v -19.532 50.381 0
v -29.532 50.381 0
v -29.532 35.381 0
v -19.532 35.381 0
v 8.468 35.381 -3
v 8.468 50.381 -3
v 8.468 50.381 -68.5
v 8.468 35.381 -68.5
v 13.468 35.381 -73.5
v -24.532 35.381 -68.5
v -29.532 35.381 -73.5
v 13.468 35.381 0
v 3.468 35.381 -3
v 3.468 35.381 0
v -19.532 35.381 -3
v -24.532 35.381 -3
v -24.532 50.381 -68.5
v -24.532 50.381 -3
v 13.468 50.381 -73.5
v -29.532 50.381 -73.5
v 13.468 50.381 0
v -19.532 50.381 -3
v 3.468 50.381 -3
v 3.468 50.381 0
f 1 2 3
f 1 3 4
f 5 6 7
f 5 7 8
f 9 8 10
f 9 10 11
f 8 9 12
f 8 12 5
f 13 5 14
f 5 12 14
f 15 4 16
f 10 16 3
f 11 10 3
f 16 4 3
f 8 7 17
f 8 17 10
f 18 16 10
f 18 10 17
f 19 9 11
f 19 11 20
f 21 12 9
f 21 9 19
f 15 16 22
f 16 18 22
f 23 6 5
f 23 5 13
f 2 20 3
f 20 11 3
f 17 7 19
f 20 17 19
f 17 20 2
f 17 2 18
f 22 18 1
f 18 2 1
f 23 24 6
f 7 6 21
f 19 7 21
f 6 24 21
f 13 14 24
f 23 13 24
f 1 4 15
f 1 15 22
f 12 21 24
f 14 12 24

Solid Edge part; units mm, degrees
sketch "Sketch1" plane through (0, 0, 0) normal (0, 0, 1) x (1, 0, 0)
  line L0 (-19.5323, 35.3812) -> (-19.5323, 50.3812)
  line L1 (-19.5323, 50.3812) -> (-24.5323, 50.3812)
  line L2 (-24.5323, 50.3812) -> (-24.5323, 35.3812)
  line L3 (-24.5323, 35.3812) -> (-19.5323, 35.3812)
  line L4 (8.4677, 50.3812) -> (8.4677, 35.3812)
  line L5 (8.4677, 35.3812) -> (3.4677, 35.3812)
  line L6 (3.4677, 35.3812) -> (3.4677, 50.3812)
  line L7 (3.4677, 50.3812) -> (8.4677, 50.3812)
  dimension "D1" = 33
  dimension "D2" = 15
extrude "Protrusion1" add sketch "Sketch1" against normal blind 3
sketch "Sketch2" plane through (0, 0, 0) normal (0, 0, 1) x (1, 0, 0)
  line L0 (13.4677, 35.3812) -> (13.4677, 50.3812)
  line L1 (13.4677, 50.3812) -> (8.4677, 50.3812)
  line L2 (8.4677, 50.3812) -> (8.4677, 35.3812)
  line L3 (8.4677, 35.3812) -> (13.4677, 35.3812)
  line L4 (-29.5323, 35.3812) -> (-24.5323, 35.3812)
  line L5 (-24.5323, 35.3812) -> (-24.5323, 50.3812)
  line L6 (-24.5323, 50.3812) -> (-29.5323, 50.3812)
  line L7 (-29.5323, 50.3812) -> (-29.5323, 35.3812)
extrude "Protrusion2" add sketch "Sketch2" against normal blind 68.5
sketch "Sketch3" plane through (13.4677, 42.8812, -34.25) normal (1, 0, 0) x (0, -1, 0)
  line L0 (7.5, 34.25) -> (7.5, 39.25)
  line L1 (7.5, 39.25) -> (-7.5, 39.25)
  line L2 (-7.5, 39.25) -> (-7.5, 34.25)
  line L3 (-7.5, 34.25) -> (7.5, 34.25)
extrude "Protrusion3" add sketch "Sketch3" against normal blind 43
